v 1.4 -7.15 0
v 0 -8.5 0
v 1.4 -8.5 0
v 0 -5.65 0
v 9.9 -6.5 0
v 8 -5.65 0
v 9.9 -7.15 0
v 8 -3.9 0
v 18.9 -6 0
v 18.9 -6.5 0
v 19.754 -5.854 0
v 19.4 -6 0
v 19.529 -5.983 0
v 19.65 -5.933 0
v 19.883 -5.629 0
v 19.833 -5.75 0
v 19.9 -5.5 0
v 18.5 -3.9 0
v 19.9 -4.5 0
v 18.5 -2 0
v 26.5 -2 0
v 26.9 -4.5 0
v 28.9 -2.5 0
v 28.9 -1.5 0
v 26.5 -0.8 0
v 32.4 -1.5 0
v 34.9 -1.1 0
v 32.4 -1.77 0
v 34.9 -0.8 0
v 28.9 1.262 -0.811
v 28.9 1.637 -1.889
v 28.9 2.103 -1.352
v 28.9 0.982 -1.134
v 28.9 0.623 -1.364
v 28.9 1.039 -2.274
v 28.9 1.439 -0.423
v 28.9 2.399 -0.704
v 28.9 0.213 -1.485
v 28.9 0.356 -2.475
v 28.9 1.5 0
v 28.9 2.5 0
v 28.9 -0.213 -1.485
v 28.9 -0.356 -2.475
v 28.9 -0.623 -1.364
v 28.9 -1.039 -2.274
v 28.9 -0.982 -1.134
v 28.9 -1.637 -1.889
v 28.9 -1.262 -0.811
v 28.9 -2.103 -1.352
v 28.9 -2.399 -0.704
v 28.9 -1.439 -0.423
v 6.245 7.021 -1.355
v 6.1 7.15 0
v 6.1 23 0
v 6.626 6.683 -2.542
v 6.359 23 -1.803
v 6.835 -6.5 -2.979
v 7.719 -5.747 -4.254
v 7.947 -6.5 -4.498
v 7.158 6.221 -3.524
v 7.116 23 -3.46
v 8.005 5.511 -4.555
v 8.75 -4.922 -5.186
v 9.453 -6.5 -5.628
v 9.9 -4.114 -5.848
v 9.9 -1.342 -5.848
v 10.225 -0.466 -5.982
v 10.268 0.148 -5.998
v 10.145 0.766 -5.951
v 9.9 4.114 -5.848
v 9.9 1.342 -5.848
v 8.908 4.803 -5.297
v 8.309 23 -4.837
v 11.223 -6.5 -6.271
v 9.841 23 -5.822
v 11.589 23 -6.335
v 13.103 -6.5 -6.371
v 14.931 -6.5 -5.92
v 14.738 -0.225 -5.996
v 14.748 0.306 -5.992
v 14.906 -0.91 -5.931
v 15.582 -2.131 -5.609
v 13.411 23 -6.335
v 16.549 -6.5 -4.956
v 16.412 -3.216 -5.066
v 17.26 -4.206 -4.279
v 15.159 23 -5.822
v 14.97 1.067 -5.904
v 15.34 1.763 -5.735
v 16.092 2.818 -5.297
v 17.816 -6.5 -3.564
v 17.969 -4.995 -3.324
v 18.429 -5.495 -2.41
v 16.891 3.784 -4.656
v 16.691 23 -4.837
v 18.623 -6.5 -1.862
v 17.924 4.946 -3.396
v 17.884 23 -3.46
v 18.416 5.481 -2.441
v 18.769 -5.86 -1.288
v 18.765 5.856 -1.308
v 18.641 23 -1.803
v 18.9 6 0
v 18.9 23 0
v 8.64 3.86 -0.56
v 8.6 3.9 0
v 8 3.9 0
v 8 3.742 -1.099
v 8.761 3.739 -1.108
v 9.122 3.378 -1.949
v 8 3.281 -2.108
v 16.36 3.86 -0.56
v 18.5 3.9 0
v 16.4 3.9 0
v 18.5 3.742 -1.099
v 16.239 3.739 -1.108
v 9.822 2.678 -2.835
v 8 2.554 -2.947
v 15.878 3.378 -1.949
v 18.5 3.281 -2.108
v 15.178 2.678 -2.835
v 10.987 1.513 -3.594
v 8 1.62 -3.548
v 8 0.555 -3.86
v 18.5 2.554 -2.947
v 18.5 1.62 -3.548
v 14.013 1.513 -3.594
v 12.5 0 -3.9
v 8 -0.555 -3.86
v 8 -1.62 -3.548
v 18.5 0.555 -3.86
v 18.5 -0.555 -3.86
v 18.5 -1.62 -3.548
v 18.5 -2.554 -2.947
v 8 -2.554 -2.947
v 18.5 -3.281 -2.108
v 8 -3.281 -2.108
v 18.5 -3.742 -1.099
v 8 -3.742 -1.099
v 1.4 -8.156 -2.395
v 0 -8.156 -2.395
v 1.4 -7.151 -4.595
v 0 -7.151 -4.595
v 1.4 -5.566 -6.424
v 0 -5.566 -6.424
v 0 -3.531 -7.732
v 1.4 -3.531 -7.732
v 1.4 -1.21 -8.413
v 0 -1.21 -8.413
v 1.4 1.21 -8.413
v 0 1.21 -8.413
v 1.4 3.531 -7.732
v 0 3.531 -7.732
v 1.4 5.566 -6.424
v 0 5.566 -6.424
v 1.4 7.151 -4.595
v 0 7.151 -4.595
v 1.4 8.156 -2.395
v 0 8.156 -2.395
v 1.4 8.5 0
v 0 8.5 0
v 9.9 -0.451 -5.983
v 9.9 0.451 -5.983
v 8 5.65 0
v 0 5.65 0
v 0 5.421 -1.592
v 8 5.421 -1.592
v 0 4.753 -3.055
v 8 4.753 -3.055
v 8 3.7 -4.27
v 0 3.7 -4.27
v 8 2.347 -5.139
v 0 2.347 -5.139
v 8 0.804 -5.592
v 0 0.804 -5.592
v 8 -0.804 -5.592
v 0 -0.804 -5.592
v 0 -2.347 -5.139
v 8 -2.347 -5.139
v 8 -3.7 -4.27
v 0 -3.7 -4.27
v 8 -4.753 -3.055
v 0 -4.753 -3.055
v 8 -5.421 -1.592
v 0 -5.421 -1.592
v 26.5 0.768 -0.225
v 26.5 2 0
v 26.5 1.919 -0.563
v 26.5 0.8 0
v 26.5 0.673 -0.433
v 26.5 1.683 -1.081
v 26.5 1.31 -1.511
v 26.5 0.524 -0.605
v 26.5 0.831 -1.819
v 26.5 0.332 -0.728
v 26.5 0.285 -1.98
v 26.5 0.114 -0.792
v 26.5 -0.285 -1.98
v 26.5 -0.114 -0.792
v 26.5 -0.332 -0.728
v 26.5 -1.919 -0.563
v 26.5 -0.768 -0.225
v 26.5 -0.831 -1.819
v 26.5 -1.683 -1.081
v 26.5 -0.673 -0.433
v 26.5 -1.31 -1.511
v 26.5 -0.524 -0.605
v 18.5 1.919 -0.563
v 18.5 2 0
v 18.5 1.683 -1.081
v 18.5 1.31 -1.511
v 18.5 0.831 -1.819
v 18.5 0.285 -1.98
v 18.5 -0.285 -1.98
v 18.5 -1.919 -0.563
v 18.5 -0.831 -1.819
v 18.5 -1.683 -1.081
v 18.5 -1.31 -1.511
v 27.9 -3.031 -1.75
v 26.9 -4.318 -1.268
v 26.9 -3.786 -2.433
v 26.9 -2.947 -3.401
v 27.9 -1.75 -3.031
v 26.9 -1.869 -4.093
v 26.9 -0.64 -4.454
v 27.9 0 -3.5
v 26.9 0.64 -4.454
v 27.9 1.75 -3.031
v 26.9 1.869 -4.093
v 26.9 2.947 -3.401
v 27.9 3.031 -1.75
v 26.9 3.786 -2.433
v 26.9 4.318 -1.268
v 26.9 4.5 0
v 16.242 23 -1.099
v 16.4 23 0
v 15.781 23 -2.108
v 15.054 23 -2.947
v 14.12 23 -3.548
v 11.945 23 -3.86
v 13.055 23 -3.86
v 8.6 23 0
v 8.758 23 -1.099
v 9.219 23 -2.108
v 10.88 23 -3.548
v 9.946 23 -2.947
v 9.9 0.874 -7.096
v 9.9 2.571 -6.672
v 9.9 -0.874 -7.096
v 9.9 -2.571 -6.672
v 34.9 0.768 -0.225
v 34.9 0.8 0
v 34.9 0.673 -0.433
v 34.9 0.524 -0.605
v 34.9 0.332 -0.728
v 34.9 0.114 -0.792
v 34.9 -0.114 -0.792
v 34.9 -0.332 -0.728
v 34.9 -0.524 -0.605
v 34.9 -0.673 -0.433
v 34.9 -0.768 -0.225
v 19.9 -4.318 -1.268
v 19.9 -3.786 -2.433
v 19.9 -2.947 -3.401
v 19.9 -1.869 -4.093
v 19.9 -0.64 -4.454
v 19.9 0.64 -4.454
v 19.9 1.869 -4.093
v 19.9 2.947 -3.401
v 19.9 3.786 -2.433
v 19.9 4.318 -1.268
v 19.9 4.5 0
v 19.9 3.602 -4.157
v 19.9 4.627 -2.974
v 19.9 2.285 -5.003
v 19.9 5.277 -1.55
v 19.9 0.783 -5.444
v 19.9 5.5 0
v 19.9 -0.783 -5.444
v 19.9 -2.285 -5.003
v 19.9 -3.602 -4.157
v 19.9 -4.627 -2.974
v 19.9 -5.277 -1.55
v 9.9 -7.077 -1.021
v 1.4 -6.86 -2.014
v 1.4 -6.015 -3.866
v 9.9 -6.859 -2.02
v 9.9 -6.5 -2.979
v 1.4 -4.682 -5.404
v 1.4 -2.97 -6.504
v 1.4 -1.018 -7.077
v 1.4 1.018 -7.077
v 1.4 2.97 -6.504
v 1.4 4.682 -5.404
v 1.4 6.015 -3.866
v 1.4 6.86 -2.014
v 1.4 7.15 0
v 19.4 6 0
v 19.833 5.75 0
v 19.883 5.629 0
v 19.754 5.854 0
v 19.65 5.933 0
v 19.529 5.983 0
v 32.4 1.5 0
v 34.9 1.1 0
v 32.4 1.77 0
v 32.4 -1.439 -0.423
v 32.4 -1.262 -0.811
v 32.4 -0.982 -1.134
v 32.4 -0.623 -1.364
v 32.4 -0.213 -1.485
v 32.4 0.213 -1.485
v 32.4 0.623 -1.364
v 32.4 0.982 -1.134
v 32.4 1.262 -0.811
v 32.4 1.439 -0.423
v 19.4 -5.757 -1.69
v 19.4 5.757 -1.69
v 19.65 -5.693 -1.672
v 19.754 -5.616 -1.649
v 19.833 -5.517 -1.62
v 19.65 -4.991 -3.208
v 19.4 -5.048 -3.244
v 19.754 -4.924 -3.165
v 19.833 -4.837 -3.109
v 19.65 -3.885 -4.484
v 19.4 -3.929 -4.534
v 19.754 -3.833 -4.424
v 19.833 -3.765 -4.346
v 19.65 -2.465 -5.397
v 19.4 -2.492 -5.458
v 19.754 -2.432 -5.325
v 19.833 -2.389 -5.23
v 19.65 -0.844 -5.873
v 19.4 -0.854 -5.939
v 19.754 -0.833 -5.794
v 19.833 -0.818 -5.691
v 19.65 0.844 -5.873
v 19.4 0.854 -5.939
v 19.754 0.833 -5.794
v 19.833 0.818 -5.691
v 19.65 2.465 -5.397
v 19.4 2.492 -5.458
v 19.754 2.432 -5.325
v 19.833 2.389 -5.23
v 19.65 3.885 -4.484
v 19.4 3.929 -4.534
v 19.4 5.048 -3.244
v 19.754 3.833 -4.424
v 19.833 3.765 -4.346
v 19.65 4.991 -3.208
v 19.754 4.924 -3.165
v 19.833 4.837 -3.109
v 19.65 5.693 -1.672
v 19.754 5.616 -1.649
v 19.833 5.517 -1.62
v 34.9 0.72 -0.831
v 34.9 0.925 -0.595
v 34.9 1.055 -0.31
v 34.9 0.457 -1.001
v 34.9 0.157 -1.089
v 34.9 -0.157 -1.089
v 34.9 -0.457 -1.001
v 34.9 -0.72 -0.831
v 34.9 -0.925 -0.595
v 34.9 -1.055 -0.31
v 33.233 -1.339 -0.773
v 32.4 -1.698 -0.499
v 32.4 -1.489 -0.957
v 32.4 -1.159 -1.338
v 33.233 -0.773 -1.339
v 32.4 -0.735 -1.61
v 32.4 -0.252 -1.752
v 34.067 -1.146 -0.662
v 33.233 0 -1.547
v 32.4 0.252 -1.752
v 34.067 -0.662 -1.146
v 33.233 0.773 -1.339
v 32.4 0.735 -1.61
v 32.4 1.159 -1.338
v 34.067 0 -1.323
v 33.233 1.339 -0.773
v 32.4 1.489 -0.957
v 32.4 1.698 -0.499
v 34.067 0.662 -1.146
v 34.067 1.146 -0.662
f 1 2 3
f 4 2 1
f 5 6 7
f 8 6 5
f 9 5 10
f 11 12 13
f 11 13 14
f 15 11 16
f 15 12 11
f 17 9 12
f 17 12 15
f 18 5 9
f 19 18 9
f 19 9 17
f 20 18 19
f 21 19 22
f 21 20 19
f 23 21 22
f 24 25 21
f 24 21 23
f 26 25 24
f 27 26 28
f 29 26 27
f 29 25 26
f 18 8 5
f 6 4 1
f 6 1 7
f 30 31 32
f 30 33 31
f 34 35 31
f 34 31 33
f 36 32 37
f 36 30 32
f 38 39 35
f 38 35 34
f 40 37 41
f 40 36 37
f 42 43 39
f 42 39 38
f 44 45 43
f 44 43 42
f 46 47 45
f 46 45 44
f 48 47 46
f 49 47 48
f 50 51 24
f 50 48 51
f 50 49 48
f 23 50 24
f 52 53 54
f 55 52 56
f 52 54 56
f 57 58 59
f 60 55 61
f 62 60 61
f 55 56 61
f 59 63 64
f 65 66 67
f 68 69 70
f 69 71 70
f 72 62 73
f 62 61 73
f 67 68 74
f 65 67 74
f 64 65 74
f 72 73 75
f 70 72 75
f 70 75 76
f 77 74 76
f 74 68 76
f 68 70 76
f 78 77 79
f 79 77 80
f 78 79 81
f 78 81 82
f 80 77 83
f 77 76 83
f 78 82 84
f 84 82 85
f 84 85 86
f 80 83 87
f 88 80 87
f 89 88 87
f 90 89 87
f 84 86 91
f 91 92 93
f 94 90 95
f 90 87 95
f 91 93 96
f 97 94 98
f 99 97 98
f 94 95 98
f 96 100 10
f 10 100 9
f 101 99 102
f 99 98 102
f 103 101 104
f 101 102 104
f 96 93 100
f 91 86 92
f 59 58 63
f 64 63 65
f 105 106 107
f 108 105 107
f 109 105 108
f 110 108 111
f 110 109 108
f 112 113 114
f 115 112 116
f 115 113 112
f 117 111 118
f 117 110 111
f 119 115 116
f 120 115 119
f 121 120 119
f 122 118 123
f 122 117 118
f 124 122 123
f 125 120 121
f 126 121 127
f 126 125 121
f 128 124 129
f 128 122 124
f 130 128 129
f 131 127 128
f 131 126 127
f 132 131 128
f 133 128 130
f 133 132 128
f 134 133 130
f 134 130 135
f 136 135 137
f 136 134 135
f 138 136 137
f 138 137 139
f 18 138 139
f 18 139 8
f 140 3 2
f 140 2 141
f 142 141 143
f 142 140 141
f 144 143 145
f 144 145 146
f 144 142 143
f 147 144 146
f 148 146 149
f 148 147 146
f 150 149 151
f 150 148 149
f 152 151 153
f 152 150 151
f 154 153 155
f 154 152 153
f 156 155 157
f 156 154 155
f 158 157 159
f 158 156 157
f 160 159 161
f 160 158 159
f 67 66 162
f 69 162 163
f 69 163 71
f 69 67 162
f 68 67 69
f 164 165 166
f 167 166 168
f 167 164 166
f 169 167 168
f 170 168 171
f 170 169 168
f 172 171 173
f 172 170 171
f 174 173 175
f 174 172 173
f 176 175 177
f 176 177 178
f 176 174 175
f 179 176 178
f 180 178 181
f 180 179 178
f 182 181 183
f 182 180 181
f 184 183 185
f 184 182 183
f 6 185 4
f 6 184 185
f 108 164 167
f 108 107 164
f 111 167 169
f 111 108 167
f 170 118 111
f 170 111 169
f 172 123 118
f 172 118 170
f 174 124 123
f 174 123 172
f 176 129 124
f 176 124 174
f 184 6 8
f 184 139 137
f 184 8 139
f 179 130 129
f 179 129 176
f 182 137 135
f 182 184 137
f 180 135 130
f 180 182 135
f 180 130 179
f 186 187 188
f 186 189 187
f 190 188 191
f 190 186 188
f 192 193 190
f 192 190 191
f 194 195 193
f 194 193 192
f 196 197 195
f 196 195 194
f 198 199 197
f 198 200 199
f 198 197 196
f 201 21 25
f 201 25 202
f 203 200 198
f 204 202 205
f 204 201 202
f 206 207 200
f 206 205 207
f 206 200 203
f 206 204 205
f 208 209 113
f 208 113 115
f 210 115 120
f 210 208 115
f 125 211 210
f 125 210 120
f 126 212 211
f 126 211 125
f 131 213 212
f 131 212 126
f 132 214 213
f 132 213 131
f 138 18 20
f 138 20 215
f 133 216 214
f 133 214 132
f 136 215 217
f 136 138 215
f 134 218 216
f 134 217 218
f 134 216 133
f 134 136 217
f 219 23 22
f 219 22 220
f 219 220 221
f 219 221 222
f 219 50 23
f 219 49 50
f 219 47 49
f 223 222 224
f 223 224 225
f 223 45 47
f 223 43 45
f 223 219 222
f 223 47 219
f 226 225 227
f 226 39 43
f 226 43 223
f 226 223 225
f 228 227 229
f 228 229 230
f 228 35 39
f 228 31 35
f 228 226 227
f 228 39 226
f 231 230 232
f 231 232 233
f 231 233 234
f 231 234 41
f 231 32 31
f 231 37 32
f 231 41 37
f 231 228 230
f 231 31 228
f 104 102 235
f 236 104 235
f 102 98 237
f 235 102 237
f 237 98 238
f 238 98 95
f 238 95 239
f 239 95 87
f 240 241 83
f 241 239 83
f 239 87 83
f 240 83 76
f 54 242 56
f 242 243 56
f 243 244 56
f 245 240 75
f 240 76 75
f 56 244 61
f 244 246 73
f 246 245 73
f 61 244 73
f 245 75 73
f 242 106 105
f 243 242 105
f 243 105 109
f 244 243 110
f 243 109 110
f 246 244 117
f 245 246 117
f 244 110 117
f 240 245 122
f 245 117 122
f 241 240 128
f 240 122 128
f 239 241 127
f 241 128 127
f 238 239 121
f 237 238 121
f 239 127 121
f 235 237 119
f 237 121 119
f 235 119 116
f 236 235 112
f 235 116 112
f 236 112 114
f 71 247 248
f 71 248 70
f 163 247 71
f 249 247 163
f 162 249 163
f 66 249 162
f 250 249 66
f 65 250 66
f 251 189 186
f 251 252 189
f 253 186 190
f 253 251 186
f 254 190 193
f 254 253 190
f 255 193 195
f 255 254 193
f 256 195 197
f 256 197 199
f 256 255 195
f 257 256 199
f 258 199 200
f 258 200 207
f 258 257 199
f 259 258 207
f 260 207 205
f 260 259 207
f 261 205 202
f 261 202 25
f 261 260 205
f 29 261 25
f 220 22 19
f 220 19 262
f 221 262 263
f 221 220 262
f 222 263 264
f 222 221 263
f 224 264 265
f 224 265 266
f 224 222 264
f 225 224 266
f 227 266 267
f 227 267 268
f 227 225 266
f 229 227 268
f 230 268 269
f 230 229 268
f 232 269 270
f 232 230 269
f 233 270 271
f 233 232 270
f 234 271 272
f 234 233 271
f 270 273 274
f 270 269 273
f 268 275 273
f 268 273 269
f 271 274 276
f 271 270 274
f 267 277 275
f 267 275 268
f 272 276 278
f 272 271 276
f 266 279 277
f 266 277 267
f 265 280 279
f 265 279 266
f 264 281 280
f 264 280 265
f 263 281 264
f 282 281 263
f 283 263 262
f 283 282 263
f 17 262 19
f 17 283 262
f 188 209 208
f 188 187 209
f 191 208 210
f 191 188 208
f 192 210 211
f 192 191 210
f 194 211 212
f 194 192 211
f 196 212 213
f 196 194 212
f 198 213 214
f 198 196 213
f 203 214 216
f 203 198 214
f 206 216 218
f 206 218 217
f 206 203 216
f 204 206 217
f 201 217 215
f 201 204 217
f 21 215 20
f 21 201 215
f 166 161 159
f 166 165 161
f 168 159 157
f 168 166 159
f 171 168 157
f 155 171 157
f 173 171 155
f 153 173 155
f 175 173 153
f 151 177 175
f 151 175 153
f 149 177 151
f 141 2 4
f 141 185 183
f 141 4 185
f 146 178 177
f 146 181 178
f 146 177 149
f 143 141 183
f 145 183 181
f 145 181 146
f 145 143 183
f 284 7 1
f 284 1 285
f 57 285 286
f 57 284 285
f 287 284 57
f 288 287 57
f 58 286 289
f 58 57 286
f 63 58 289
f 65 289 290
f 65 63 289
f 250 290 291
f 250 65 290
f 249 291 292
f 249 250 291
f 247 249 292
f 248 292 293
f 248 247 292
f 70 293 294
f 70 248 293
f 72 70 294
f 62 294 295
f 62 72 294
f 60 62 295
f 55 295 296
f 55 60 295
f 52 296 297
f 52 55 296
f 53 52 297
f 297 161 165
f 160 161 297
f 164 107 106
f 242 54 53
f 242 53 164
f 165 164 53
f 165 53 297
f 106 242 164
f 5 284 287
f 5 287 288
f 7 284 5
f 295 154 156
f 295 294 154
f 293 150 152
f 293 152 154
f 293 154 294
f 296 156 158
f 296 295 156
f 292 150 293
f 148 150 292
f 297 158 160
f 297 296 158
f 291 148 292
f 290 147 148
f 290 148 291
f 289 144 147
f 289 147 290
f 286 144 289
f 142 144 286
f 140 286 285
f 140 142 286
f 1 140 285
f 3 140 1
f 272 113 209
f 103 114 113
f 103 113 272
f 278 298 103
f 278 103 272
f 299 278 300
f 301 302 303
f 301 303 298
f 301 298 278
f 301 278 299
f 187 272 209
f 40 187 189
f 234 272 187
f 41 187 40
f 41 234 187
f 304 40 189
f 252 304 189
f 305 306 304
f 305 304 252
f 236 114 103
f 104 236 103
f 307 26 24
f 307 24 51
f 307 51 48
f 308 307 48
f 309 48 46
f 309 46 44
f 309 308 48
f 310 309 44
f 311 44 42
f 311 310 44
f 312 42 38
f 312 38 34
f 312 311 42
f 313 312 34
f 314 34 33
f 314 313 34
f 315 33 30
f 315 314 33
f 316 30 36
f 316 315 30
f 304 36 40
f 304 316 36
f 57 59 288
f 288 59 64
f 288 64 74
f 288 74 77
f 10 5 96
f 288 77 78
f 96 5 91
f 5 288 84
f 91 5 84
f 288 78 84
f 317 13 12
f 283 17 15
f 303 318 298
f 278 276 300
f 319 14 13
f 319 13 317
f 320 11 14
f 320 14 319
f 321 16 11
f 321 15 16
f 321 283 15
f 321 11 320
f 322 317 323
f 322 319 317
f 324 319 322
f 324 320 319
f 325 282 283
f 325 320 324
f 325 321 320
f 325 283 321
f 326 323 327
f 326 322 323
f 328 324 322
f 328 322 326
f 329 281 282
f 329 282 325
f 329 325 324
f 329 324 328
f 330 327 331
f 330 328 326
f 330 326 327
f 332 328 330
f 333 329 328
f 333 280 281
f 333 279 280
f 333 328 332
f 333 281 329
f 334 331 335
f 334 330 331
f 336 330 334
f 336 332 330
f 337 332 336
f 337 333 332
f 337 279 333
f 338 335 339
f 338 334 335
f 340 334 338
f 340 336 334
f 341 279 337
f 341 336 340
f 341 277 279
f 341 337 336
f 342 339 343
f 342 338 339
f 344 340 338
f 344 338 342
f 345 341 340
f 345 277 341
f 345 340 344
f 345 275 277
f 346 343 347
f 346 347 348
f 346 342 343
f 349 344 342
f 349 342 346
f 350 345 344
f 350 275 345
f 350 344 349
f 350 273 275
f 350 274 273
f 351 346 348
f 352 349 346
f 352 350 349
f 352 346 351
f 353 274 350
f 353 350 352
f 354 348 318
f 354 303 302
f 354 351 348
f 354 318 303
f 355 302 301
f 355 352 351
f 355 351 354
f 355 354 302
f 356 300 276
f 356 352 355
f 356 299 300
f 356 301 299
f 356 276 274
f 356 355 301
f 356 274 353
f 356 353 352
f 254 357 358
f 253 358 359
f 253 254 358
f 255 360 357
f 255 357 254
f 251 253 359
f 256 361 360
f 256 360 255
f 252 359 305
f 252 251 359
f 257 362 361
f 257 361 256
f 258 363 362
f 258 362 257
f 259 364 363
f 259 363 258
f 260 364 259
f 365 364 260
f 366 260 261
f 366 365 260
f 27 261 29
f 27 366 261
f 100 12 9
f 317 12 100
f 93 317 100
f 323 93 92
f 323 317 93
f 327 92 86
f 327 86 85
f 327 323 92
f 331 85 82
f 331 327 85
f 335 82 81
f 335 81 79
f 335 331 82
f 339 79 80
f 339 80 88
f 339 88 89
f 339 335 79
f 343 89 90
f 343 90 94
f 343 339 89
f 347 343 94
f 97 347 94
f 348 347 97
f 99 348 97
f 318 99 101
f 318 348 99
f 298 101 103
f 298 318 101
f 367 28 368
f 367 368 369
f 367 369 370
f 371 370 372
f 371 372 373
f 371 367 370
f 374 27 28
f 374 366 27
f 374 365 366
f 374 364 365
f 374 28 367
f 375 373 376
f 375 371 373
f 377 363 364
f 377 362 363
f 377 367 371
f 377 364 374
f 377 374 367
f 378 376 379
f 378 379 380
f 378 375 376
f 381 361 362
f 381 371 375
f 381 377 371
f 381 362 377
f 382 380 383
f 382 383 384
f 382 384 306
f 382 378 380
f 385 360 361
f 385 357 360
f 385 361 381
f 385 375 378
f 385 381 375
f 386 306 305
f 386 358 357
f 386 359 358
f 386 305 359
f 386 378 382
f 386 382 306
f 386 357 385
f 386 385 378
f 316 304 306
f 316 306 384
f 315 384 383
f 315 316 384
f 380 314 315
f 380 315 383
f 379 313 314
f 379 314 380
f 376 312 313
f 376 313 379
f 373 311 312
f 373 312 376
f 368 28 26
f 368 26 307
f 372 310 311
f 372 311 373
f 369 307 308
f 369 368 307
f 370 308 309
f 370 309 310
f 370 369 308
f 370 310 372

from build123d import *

# Parameters (mm, degrees)
CONG_1_R                = 0.5
ENL_V_START             = -23
ESQUISSE9_R             = 3.9
ENL_V_MAT_EXTRU_4_DEPTH = 23
ESQUISSE10_W            = 39.610149942
ESQUISSE10_H            = 38.899653979
ENL_V_MAT_EXTRU_5_DEPTH = 43.652784254


with BuildPart() as part:
    # Esquisse1 → Base-Révolution (revolve)
    with BuildSketch(Plane.XY, mode=Mode.PRIVATE) as base_r_volution_sk:
        Polygon((0, 0), (0, 8.5), (1.4, 8.5), (1.4, 7.15), (9.9, 7.15), (9.9, 6), (19.9, 6), (19.9, 4.5), (26.9, 4.5), (28.9, 2.5), (28.9, 1.5), (32.4, 1.5), (32.4, 1.769872981), (34.9, 1.1), (34.9, 0), align=None)
    revolve(base_r_volution_sk.sketch.rotate(Axis((0, 0, 0), (1, 0, 0)), 90), axis=Axis((0, 0, 0), (1, 0, 0)))

    # Esquisse2 → Boss.-Révol.1 (revolve)
    with BuildSketch(Plane.XY):
        Polygon((8.6, 23), (8.6, -4), (12.5, -4), (12.5, -6.5), (6.1, -6.5), (6.1, 23), align=None)
    revolve(axis=Axis((12.5, 24, 0), (0, -1, 0)))

    # Esquisse7 → Enlèvement de matière-Révolution1 (revolve, cut)
    with BuildSketch(Plane.XY, mode=Mode.PRIVATE) as enl_vement_de_mati_re_r_volution1_sk:
        Polygon((34.9, 0.8), (34.9, 0), (0, 0), (0, 5.65), (8, 5.65), (8, 3.9), (18.5, 3.9), (18.5, 2), (26.5, 2), (26.5, 0.8), align=None)
    revolve(enl_vement_de_mati_re_r_volution1_sk.sketch.rotate(Axis((36, 0, 0), (-1, 0, 0)), 90), axis=Axis((36, 0, 0), (-1, 0, 0)), mode=Mode.SUBTRACT)

    # Congé1
    cong_1_edges = [part.edges().sort_by_distance(p)[0] for p in [
        (19.9, 0, -6),
        (9.9, -2.157400318, 6.816753177),
    ]]
    fillet(cong_1_edges, radius=CONG_1_R)

    # Esquisse9 → Enlèv. mat.-Extru.4 (cut)
    with BuildSketch(Plane(origin=(0, 23, 0), x_dir=(-1, 0, 0), z_dir=(0, 1, 0)).offset(ENL_V_START)):
        with Locations((-12.5, 0)):
            Circle(ESQUISSE9_R)
    extrude(amount=ENL_V_MAT_EXTRU_4_DEPTH, mode=Mode.SUBTRACT)

    # Esquisse10 → Enlèv. mat.-Extru.5 (cut, through all)
    with BuildSketch(Plane.XY):
        with Locations((16.621088043, 7.131584007)):
            Rectangle(ESQUISSE10_W, ESQUISSE10_H)
    extrude(amount=ENL_V_MAT_EXTRU_5_DEPTH, mode=Mode.SUBTRACT)


solid = part.part
